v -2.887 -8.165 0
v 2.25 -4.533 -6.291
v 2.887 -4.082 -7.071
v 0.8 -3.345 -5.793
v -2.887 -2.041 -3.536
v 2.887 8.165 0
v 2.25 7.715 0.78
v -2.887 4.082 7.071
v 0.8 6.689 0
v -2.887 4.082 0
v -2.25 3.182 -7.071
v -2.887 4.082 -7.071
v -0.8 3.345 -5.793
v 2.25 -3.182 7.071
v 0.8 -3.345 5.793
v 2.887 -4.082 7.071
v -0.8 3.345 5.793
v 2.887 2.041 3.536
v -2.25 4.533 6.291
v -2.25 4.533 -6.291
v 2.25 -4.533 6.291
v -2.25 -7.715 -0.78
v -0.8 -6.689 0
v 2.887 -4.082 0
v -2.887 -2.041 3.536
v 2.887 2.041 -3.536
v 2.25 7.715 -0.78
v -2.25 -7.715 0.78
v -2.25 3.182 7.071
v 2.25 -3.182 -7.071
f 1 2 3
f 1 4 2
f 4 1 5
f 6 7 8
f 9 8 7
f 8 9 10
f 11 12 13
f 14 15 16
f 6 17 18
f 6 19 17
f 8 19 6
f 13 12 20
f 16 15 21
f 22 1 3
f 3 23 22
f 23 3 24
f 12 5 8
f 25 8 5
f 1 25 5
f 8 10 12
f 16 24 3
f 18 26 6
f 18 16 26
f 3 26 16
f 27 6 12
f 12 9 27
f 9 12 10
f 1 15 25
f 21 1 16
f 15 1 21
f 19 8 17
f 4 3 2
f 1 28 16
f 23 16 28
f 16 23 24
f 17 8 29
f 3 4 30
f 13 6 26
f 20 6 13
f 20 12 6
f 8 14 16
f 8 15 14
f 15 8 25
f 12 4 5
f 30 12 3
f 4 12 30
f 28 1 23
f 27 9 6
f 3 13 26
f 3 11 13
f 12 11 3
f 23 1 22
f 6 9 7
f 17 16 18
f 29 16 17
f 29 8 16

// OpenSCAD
// OpenSCAD 为免费开源的跨平台建模软件
// 作者：上海市第三女子初级中学 谢丁

a = 10; // 立方体的边长
e = 0.0; // 咬合面距离调整，数值越小，咬合精度越高
length = norm([a, a, a]); // 欧氏距离
b = acos(a / length); // 倾斜角
c = atan2(a, a);    // 方位角

for (i = [1:3]) // 循环三次
{
  rotate([i * 120, 0, 0]) // 每隔120°生成一个正三棱柱结构
  intersection() // 相交布尔运算
  {
    difference() // 相减布尔运算
    {
      rotate([0, -c, 90 - b]) cube([a, a, a], center = true); // 原始立方体
      translate([-length / 3, 0, 0]) cube([sqrt(3)*a / 3, sqrt(3)*a, sqrt(3)*a], center = true); // 左侧的立方体结构
      translate([length / 3, 0, 0]) cube([sqrt(3)*a / 3, sqrt(3)*a, sqrt(3)*a], center = true); // 右侧的立方体结构
    }
    // 正三棱柱结构
  % translate([0, sqrt(3)*a / 2 + e, 0]) rotate([30, 0, 0]) rotate([0, 90, 0]) cylinder(h = sqrt(3) * a / 3, r = sqrt(3) * a / 2, $fn = 3, center = true);
  }
}
